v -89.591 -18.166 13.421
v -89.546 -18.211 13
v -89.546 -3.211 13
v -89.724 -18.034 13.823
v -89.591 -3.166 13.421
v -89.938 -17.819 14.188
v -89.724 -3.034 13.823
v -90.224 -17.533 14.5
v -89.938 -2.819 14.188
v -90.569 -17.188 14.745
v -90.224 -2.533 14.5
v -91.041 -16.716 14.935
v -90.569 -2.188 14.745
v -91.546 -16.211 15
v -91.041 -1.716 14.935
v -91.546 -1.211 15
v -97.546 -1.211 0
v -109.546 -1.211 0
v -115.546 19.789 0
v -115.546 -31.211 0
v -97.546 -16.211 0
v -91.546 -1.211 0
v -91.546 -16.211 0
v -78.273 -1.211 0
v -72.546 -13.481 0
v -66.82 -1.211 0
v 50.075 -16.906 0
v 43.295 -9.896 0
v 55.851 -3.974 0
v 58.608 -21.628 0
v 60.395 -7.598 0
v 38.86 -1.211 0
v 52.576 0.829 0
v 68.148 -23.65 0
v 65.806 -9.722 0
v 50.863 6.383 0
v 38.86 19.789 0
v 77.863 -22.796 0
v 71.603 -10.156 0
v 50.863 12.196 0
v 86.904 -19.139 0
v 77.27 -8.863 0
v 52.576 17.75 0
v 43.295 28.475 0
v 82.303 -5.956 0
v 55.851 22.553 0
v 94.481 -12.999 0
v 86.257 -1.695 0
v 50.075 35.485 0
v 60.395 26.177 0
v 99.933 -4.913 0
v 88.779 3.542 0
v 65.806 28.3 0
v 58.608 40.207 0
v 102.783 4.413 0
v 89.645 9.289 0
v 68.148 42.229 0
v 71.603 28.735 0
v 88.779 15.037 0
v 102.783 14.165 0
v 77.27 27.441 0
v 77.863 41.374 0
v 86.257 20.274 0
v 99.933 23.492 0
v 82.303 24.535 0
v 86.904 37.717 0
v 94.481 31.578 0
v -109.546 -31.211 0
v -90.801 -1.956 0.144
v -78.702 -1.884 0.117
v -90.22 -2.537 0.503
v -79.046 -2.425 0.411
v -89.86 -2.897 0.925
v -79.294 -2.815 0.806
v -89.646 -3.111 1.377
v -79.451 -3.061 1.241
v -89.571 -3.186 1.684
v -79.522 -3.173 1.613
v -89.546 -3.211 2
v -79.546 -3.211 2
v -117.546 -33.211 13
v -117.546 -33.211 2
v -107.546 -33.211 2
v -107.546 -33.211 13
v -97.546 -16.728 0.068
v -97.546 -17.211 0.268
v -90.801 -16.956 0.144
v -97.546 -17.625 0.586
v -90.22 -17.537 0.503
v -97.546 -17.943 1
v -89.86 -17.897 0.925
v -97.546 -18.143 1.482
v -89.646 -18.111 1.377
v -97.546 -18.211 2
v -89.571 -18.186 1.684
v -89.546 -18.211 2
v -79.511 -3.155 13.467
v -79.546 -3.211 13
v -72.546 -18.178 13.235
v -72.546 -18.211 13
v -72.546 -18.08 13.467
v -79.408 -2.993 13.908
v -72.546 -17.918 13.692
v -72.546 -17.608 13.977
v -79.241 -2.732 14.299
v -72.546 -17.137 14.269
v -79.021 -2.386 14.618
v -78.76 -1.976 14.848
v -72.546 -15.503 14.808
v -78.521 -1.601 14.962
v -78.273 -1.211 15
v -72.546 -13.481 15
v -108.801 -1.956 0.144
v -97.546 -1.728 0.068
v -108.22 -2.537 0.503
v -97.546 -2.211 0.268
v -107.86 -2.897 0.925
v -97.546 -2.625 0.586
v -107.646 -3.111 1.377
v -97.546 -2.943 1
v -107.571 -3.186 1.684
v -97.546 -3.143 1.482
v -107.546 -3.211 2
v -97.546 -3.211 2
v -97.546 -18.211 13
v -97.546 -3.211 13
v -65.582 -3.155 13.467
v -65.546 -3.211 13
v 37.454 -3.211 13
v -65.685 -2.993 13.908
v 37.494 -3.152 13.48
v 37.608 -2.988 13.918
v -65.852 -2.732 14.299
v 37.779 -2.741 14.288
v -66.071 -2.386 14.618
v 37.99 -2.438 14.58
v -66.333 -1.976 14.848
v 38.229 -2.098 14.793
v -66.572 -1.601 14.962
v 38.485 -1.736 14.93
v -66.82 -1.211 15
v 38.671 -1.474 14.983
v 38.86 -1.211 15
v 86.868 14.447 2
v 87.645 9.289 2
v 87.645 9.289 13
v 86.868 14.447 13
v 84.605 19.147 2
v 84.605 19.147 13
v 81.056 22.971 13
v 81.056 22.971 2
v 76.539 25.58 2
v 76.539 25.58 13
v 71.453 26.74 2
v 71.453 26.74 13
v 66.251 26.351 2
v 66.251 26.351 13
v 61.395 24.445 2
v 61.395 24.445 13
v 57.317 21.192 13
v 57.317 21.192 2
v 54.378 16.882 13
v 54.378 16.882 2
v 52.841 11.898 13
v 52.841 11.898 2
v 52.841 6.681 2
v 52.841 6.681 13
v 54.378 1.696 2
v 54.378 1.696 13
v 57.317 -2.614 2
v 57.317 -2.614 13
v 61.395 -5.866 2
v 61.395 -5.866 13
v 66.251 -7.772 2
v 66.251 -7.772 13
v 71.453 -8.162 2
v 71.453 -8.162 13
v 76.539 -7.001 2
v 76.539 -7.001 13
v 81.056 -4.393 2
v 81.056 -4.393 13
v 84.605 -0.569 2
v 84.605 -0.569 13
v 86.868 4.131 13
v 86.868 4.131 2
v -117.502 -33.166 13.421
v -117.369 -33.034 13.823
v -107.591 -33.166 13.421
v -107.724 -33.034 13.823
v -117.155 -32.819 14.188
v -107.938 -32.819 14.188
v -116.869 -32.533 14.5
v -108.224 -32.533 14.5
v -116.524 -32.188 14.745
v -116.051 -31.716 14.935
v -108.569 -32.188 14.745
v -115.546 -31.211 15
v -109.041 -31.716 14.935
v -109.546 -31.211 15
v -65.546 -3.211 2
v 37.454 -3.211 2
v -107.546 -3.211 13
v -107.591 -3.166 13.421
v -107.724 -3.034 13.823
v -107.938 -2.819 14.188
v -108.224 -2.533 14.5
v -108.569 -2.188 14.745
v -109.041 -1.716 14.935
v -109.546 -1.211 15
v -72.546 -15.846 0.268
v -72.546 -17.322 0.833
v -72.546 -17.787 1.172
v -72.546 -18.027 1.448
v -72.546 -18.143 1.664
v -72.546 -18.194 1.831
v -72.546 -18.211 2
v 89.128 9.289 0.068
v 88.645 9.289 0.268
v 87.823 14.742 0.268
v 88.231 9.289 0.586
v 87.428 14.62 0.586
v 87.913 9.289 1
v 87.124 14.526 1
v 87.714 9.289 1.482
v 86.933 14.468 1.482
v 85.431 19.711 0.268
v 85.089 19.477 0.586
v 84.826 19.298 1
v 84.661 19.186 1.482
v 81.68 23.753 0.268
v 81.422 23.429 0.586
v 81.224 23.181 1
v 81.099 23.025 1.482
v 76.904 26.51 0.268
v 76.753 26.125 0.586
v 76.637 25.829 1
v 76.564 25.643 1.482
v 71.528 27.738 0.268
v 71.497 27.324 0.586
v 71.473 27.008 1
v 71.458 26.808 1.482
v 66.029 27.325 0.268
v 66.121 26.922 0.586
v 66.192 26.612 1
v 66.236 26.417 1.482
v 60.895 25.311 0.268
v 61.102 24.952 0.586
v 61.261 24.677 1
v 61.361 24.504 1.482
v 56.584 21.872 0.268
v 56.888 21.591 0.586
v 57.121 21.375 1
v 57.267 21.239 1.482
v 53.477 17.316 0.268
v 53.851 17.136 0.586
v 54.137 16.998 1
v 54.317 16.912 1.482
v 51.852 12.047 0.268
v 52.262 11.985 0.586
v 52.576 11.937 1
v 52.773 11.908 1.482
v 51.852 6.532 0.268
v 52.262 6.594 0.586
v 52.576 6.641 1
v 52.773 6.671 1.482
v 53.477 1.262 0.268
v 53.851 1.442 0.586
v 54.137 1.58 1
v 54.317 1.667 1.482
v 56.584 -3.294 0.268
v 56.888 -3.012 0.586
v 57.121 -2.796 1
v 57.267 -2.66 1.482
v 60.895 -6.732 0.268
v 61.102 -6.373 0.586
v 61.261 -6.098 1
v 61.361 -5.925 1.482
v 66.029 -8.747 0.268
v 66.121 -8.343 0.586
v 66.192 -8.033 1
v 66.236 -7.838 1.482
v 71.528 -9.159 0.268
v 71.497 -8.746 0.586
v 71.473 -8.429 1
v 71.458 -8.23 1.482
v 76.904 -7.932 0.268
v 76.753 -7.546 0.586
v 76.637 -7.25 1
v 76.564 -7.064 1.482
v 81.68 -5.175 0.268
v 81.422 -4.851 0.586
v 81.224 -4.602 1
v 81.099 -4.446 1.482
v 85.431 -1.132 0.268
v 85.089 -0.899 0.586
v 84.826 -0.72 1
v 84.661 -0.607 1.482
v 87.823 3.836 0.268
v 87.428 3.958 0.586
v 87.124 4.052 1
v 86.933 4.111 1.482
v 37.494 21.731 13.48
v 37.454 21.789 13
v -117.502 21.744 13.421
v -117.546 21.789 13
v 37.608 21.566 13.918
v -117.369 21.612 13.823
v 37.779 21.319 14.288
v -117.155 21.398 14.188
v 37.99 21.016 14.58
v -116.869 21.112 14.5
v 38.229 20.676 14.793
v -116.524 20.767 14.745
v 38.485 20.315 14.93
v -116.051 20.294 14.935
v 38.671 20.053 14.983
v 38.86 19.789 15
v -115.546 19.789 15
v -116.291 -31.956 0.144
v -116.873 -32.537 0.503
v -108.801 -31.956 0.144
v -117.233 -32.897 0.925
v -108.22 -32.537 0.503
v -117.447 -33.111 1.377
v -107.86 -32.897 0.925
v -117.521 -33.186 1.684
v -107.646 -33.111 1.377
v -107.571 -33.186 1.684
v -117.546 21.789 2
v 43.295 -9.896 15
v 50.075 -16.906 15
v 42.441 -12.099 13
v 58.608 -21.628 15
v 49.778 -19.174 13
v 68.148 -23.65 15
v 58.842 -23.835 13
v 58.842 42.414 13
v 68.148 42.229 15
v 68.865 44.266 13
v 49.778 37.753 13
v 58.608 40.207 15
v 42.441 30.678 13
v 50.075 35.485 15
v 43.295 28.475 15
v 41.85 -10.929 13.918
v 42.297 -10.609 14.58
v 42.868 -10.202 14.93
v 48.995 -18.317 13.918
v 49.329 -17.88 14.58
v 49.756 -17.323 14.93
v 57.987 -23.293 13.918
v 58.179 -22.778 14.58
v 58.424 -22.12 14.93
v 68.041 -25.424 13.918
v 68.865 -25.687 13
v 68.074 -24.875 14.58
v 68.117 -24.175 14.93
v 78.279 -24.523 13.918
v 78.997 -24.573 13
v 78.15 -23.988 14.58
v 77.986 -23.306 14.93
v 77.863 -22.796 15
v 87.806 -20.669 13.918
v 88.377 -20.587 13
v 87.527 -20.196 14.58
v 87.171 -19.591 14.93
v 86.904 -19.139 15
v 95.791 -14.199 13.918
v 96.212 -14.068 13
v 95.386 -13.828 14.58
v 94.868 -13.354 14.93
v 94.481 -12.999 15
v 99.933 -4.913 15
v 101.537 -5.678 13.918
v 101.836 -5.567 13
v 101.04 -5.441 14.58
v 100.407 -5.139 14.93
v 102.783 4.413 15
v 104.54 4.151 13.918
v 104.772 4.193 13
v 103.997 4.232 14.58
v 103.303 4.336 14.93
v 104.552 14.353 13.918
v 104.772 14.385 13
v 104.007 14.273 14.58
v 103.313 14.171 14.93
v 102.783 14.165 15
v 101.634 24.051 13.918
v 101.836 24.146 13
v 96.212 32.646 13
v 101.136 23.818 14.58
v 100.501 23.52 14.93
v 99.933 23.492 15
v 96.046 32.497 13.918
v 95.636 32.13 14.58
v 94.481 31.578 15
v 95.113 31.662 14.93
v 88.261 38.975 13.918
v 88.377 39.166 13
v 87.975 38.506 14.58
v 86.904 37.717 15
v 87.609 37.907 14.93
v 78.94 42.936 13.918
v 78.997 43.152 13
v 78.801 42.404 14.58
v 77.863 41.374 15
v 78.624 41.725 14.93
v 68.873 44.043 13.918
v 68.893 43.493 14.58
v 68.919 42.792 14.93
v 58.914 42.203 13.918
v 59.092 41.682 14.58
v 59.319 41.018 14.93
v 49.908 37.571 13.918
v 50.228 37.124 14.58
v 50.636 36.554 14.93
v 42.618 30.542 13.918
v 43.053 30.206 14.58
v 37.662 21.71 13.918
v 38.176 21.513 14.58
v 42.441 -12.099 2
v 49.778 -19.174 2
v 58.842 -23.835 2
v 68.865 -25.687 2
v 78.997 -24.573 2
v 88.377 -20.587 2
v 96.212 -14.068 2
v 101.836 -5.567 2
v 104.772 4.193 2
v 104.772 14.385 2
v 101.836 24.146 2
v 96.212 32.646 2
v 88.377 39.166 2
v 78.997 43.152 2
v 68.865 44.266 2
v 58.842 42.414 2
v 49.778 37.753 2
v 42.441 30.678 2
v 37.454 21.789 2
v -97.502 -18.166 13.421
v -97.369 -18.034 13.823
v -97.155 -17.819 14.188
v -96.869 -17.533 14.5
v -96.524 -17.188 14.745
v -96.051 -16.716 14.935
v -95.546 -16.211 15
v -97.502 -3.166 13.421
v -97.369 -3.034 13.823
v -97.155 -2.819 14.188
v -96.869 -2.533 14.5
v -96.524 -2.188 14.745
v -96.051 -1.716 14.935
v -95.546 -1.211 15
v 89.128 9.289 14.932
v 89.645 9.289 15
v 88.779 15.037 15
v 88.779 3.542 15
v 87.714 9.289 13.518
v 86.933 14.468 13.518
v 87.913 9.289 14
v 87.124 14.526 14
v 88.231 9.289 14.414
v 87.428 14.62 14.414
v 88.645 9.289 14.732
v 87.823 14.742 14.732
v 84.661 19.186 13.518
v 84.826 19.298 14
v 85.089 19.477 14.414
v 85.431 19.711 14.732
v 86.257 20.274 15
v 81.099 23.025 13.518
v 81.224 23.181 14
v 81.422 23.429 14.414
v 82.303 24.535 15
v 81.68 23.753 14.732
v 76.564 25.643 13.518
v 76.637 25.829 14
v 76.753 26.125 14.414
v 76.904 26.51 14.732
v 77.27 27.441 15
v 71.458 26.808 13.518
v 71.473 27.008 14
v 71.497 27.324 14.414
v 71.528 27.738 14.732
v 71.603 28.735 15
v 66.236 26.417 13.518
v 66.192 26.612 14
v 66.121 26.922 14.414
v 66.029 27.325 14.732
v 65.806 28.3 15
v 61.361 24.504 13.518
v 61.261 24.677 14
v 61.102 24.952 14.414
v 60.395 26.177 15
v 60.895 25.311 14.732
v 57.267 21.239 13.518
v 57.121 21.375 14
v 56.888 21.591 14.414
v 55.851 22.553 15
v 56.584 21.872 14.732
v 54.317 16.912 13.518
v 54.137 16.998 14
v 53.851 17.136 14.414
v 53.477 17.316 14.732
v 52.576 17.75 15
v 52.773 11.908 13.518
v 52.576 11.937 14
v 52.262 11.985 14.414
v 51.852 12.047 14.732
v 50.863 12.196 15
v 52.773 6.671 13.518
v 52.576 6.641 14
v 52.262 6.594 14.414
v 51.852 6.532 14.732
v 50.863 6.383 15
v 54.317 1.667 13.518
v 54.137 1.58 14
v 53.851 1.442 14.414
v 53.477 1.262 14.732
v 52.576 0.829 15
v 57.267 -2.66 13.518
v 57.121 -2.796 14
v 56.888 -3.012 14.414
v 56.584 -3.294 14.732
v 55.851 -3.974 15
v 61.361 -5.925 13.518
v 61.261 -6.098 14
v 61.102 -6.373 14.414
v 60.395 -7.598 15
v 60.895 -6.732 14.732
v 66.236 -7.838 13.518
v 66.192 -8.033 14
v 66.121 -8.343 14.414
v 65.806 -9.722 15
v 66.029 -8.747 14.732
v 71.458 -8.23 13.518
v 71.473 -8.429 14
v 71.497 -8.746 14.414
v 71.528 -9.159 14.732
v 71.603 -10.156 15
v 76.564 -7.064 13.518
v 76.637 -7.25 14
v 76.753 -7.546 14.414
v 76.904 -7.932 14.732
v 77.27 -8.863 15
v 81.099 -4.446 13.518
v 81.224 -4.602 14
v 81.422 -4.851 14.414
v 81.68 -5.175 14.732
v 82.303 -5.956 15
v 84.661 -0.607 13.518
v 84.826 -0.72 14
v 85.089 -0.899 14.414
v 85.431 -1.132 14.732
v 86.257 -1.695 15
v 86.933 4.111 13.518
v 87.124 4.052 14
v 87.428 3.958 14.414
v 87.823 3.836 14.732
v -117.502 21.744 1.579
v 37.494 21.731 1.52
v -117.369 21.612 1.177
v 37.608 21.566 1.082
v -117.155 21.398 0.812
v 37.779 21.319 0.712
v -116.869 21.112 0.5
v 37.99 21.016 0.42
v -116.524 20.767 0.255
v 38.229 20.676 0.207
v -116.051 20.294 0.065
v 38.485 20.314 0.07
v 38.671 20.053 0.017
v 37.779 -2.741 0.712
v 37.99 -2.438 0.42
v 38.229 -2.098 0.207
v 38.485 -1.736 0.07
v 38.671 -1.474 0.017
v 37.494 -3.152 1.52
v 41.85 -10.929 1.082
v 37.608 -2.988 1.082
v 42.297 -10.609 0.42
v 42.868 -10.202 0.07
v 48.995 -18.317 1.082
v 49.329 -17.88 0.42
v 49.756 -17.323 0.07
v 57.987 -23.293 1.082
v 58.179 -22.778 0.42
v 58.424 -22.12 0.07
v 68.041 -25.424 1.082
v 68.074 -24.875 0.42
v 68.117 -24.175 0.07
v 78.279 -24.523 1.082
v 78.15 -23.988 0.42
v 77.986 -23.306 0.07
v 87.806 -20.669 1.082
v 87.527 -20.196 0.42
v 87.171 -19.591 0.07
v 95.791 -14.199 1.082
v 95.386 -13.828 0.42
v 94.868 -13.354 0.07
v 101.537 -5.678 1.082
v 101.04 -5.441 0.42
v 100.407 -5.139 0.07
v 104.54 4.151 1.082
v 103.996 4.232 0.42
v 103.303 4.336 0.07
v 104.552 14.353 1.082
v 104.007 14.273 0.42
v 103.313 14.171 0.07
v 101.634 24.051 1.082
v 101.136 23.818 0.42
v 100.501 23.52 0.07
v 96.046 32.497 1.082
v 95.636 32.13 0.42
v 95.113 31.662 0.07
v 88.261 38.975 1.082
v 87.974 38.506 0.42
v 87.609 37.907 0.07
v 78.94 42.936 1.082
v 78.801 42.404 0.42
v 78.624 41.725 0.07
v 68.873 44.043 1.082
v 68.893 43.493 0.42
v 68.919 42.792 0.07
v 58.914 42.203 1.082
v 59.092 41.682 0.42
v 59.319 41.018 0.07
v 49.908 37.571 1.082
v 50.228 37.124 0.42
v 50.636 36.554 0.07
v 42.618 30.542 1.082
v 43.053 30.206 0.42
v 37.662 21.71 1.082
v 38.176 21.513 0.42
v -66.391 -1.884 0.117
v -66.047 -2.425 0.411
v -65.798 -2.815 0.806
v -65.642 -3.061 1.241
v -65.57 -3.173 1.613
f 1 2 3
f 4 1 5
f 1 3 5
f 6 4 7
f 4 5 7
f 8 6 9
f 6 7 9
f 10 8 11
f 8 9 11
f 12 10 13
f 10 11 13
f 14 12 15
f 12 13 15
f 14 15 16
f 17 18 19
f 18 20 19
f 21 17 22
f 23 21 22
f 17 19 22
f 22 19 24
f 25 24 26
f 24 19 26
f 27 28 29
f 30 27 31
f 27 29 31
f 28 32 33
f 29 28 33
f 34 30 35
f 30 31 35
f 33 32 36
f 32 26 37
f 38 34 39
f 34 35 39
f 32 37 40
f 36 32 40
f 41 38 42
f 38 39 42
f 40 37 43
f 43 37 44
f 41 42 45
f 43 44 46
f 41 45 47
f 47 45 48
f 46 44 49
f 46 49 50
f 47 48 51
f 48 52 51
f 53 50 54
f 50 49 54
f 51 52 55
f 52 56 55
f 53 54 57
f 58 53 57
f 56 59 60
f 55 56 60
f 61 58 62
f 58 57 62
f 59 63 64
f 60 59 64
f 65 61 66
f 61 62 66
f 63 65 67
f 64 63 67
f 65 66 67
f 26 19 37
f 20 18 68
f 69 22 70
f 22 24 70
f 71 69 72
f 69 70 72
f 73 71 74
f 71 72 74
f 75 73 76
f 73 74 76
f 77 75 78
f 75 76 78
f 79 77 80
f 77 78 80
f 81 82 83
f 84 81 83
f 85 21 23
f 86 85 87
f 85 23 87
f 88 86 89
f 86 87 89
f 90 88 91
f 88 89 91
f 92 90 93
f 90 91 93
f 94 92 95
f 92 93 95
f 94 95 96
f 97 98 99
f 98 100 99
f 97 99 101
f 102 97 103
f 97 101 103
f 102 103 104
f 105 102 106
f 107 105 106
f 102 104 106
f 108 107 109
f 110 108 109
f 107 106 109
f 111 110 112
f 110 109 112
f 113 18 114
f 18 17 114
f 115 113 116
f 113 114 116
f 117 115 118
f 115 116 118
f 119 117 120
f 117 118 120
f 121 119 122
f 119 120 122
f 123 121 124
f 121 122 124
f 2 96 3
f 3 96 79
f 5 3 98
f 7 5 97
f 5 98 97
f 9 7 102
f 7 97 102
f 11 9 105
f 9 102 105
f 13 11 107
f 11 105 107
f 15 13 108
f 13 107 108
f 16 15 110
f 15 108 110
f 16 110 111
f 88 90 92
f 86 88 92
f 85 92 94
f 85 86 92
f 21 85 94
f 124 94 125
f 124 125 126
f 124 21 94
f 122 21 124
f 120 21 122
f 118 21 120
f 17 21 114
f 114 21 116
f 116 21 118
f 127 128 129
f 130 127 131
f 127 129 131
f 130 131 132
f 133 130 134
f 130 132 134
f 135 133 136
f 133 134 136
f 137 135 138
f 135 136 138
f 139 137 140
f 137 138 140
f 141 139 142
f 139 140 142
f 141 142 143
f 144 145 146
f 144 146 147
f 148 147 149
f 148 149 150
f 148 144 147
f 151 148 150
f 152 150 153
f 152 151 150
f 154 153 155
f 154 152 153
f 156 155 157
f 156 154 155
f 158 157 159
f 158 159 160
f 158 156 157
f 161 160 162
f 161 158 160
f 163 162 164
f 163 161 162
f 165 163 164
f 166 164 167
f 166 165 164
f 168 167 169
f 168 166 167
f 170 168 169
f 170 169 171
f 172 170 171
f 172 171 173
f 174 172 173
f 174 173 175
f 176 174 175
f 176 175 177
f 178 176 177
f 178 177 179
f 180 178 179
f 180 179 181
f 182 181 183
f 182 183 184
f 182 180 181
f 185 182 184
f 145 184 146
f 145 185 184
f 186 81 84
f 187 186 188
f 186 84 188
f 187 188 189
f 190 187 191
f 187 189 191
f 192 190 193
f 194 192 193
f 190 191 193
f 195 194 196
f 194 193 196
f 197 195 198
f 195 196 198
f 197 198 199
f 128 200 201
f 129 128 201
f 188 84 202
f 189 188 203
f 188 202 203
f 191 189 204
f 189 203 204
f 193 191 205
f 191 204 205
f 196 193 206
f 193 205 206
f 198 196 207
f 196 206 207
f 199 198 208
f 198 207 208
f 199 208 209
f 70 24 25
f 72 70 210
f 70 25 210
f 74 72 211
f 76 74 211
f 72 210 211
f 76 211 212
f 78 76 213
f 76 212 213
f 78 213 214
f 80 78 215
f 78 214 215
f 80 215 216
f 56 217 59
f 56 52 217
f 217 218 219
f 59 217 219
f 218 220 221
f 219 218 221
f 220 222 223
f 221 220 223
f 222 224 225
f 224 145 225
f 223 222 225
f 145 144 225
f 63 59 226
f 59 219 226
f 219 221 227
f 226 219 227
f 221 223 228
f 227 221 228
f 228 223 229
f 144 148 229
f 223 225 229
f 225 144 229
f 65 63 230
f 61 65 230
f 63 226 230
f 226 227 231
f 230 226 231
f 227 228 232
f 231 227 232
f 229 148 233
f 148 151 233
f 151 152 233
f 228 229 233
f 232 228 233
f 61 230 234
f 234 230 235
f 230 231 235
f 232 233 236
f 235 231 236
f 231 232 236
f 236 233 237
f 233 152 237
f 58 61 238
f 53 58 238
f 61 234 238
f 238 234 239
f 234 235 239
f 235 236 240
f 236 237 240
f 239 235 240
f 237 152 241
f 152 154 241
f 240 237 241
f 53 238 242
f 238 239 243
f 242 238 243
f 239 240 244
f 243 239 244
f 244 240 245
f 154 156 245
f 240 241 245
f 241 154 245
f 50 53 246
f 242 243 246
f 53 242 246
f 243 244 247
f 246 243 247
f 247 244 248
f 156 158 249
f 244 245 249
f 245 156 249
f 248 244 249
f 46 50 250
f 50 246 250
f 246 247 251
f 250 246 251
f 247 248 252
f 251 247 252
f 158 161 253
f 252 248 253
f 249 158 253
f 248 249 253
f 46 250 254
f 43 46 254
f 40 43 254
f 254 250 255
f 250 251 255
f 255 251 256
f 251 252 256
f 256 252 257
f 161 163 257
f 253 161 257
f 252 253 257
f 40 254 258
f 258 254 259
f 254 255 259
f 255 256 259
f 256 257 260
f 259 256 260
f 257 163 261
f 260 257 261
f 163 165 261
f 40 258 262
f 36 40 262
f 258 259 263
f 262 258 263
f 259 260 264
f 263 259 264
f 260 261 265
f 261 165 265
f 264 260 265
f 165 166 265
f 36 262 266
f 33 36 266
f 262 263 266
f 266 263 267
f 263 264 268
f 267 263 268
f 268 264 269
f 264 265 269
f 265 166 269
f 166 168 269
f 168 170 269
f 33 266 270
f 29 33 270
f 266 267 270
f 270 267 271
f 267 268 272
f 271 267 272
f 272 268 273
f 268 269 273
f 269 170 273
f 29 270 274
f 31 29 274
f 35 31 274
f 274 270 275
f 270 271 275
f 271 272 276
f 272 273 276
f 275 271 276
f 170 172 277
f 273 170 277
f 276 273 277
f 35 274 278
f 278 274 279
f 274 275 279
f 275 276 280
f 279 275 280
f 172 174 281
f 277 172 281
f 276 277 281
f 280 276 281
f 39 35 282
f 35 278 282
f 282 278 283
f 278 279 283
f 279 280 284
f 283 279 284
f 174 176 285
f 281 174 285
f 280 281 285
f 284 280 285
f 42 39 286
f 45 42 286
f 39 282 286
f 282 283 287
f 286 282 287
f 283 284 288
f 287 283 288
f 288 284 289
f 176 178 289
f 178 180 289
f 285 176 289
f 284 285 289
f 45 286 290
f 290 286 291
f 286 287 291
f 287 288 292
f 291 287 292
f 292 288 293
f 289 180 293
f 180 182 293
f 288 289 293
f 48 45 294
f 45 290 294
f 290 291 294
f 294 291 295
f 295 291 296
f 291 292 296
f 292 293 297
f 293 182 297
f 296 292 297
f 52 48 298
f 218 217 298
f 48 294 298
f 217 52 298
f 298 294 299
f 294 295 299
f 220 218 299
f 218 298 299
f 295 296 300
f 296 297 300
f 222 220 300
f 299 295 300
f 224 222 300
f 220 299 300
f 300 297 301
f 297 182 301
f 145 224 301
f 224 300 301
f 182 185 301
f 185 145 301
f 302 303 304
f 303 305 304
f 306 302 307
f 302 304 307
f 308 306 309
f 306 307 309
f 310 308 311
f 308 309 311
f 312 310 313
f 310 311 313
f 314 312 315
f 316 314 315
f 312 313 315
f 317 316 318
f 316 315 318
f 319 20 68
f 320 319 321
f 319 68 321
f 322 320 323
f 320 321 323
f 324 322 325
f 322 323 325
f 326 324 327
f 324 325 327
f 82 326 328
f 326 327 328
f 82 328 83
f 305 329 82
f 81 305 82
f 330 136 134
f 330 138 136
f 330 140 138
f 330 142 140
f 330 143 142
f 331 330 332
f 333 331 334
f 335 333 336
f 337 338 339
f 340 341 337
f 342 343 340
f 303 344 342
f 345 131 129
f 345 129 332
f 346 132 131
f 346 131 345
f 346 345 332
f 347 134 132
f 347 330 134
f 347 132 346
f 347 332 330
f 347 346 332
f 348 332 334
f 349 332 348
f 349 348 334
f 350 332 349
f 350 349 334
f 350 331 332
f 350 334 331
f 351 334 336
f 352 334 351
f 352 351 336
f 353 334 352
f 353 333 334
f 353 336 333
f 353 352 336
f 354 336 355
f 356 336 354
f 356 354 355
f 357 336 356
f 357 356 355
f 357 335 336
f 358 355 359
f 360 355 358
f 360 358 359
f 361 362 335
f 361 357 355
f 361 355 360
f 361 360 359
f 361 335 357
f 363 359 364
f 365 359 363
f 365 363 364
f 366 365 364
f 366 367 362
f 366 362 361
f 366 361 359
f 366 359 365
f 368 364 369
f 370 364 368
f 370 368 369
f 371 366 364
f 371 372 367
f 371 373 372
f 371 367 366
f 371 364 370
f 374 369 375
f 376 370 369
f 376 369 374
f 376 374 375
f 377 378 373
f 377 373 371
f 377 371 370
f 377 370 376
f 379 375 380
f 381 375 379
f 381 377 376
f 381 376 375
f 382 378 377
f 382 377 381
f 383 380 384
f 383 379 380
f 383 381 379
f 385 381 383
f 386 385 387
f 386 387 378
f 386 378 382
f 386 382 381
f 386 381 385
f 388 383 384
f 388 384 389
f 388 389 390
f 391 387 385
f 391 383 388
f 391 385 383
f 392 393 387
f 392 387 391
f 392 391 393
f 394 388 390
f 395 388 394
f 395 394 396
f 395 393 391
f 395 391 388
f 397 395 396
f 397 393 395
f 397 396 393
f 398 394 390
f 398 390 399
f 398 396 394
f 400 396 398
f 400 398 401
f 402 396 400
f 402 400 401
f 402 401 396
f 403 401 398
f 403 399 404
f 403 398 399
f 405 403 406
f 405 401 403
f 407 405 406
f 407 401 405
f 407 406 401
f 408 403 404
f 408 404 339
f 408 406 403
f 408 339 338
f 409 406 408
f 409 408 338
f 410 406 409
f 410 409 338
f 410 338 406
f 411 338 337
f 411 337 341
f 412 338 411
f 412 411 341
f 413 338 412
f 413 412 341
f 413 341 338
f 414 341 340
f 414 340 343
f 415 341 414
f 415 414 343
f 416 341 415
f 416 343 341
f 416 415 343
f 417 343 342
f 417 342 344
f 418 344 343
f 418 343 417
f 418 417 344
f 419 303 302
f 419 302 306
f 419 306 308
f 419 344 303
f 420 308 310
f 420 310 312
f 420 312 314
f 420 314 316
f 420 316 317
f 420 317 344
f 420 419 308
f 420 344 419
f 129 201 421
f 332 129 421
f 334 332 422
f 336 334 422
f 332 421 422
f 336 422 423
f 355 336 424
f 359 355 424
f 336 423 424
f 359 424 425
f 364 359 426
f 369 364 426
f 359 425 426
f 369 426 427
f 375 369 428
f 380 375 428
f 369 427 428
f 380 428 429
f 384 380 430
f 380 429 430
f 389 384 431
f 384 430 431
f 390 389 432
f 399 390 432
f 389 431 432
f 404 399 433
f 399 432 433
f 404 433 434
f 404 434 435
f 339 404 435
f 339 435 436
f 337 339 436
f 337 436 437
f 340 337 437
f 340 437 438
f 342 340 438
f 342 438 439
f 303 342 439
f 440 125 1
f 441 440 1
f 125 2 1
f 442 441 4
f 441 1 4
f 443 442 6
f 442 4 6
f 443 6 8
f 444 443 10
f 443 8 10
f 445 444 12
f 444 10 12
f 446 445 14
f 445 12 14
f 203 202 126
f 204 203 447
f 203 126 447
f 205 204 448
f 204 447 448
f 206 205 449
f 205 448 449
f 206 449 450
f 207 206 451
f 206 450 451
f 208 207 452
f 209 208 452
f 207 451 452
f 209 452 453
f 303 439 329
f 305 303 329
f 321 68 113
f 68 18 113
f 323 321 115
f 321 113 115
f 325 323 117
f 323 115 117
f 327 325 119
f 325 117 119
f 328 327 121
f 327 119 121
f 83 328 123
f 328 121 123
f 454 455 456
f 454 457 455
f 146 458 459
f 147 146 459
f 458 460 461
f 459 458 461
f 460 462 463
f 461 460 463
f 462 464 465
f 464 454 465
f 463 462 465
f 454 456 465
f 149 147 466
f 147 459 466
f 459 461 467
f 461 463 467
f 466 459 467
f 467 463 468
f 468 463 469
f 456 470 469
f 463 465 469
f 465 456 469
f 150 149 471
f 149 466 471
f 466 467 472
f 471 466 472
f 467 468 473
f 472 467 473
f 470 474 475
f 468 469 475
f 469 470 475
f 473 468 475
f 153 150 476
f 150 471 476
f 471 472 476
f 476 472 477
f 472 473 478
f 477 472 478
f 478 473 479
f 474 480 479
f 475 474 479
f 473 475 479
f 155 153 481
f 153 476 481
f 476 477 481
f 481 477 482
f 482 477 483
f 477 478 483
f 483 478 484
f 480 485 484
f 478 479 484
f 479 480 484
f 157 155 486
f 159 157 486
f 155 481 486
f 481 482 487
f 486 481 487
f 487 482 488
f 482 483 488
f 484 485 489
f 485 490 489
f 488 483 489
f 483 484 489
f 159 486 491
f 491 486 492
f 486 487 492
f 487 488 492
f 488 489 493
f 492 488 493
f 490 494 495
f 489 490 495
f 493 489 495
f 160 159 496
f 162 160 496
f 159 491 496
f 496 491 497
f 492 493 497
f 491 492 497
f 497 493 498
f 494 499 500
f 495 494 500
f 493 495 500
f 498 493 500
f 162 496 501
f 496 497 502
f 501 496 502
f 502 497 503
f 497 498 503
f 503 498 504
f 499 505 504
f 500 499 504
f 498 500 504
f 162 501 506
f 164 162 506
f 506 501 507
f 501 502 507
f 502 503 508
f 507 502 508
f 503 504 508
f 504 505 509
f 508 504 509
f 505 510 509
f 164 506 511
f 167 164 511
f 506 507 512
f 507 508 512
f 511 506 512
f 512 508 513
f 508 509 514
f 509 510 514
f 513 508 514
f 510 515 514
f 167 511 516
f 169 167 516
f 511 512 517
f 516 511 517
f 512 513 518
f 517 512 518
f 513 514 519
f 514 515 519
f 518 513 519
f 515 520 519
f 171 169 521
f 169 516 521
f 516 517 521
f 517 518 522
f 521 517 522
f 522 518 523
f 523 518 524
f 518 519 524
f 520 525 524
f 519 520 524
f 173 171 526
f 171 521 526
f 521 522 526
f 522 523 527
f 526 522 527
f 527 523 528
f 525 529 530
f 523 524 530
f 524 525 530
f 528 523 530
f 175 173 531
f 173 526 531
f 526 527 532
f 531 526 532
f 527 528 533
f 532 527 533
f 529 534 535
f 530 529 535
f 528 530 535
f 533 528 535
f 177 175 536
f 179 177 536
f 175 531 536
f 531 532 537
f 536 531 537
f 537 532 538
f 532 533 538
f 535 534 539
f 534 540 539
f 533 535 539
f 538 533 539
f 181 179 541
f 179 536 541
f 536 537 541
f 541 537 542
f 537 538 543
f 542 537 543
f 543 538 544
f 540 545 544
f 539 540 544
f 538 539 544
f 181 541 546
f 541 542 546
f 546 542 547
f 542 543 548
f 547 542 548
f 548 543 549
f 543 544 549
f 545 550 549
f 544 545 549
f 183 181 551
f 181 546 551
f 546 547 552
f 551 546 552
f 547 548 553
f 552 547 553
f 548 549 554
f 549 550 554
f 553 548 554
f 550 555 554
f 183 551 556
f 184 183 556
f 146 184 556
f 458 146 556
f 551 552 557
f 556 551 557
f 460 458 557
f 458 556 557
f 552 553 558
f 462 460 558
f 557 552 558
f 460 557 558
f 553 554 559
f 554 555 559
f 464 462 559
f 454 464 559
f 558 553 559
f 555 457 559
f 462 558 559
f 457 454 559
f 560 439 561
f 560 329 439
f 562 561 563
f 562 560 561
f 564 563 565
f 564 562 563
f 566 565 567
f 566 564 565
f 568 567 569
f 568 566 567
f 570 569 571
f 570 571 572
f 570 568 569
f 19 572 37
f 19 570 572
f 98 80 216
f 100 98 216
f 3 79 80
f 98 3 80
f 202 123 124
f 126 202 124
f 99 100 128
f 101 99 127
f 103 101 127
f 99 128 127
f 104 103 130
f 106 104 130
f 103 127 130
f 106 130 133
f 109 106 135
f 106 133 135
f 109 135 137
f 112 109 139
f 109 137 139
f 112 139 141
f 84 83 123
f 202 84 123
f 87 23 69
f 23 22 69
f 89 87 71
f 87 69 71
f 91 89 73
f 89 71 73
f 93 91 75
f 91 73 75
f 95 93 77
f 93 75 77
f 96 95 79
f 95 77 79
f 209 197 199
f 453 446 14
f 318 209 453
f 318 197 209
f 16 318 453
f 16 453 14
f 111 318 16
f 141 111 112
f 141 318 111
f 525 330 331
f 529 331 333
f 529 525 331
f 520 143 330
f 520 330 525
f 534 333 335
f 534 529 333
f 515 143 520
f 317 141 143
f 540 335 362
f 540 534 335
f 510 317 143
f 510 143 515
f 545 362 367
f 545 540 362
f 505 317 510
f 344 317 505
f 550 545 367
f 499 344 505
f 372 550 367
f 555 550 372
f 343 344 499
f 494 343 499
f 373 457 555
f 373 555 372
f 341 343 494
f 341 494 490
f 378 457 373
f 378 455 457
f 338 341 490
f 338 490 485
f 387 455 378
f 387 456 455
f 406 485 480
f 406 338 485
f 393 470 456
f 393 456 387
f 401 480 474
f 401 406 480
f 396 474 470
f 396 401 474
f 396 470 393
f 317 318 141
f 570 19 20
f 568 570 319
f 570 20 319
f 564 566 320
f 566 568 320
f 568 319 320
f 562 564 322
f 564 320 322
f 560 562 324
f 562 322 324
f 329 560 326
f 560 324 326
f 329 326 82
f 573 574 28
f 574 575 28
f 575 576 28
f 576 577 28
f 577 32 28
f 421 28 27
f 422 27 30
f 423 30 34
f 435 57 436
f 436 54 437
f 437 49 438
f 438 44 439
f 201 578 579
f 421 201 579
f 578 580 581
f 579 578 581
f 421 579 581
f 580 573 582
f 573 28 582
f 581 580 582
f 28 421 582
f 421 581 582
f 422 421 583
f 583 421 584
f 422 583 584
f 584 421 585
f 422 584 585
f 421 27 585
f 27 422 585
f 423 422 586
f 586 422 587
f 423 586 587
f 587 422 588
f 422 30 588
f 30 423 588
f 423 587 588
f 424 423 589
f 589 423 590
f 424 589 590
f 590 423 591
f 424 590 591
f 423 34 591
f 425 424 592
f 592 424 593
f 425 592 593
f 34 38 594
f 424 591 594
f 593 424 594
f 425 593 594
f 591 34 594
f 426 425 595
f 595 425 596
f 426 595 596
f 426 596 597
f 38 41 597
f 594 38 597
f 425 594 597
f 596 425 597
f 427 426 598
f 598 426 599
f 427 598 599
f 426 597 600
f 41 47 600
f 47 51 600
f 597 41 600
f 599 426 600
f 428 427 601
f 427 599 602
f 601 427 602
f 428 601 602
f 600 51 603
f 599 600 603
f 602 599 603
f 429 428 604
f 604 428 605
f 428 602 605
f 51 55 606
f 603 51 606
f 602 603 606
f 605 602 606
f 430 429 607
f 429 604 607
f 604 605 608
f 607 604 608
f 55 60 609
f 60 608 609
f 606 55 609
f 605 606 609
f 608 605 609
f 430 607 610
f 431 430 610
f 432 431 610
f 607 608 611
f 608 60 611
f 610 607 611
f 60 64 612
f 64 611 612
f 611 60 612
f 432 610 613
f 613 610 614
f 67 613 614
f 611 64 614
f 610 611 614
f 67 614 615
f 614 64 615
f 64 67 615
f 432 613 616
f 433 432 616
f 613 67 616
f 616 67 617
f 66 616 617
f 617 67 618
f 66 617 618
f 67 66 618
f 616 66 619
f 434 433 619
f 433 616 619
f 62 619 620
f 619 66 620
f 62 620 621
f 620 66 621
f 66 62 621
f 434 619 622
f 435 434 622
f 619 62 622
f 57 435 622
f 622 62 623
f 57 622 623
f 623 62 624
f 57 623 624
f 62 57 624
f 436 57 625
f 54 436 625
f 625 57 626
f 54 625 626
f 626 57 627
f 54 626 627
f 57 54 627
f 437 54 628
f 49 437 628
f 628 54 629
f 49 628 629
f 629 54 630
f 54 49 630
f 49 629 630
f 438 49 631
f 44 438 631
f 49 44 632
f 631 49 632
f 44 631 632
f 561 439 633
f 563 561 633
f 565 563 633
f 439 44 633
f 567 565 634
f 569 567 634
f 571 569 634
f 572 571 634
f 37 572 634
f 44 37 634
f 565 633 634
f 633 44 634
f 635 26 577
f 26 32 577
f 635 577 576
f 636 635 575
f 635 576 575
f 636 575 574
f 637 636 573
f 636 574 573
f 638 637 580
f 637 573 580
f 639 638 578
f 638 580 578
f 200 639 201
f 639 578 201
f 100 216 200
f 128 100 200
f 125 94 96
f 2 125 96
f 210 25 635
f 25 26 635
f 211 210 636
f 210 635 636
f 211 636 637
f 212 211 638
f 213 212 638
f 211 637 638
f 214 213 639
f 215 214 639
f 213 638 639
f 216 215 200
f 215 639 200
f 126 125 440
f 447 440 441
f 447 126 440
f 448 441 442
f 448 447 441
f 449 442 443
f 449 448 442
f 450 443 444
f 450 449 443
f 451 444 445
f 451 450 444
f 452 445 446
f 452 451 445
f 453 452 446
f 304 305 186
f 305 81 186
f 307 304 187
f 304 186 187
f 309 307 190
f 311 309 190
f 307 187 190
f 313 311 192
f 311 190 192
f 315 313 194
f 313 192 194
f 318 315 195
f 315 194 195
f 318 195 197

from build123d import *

# Parameters (mm, degrees)
F0_R     = 17.5
F0_W     = 10
F0_H     = 30
F0_W_2   = 8
F0_H_2   = 15
F1_DEPTH = 15
F2_R     = 2
F3_R     = 2


with BuildPart() as f1:
    # F0 (on Top) → F1 (new body)
    with BuildSketch(Plane.XY):
        with BuildLine():
            Line((37.453632827, 21.7892740583), (-117.546367173, 21.7892740583))
            Line((-117.546367173, 21.7892740583), (-117.546367173, -3.2107259417))
            Line((-117.546367173, -3.2107259417), (-107.546367173, -3.2107259417))
            Line((-107.546367173, -3.2107259417), (-97.546367173, -3.2107259417))
            Line((-97.546367173, -3.2107259417), (-89.546367173, -3.2107259417))
            Line((-89.546367173, -3.2107259417), (-79.546367173, -3.2107259417))
            Line((-79.546367173, -3.2107259417), (-65.546367173, -3.2107259417))
            Line((-65.546367173, -3.2107259417), (37.453632827, -3.2107259417))
            ThreePointArc((37.453632827, -3.2107259417), (105.1453749035, 9.2892740583), (37.453632827, 21.7892740583))
        make_face()
        with Locations((70.1453749035, 9.2892740583)):
            Circle(F0_R, mode=Mode.SUBTRACT)
        with Locations((-112.546367173, -18.2107259417)):
            Rectangle(F0_W, F0_H)
        Polygon((-72.546367173, -18.2107862416), (-65.546367173, -3.2107259417), (-79.546367173, -3.2107259417), align=None)
        with Locations((-93.546367173, -10.7107259417)):
            Rectangle(F0_W_2, F0_H_2)
    extrude(amount=F1_DEPTH)

    # F2
    f2_edges = [f1.edges().sort_by_distance(p)[0] for p in [
        (-40.046367, 21.789274, 15),
        (-117.546367, -5.710726, 15),
        (-112.546367, -33.210726, 15),
        (-107.546367, -18.210726, 15),
        (-102.546367, -3.210726, 15),
        (-97.546367, -10.710726, 15),
        (-93.546367, -18.210726, 15),
        (-89.546367, -10.710726, 15),
        (-84.546367, -3.210726, 15),
        (-76.046367, -10.710756, 15),
        (-69.046367, -10.710756, 15),
        (-14.046367, -3.210726, 15),
        (105.145375, 9.289274, 15),
        (52.645375, 9.289274, 15),
    ]]
    fillet(f2_edges, radius=F2_R)

    # F3
    f3_edges = [f1.edges().sort_by_distance(p)[0] for p in [
        (105.145375, 9.289274, 0),
        (52.645375, 9.289274, 0),
        (-40.046367, 21.789274, 0),
        (-14.046367, -3.210726, 0),
        (-69.046367, -10.710756, 0),
        (-89.546367, -10.710726, 0),
        (-93.546367, -18.210726, 0),
        (-107.546367, -18.210726, 0),
        (-117.546367, -5.710726, 0),
        (-112.546367, -33.210726, 0),
        (-102.546367, -3.210726, 0),
        (-76.046367, -10.710756, 0),
        (-84.546367, -3.210726, 0),
    ]]
    fillet(f3_edges, radius=F3_R)


solid = f1.part
